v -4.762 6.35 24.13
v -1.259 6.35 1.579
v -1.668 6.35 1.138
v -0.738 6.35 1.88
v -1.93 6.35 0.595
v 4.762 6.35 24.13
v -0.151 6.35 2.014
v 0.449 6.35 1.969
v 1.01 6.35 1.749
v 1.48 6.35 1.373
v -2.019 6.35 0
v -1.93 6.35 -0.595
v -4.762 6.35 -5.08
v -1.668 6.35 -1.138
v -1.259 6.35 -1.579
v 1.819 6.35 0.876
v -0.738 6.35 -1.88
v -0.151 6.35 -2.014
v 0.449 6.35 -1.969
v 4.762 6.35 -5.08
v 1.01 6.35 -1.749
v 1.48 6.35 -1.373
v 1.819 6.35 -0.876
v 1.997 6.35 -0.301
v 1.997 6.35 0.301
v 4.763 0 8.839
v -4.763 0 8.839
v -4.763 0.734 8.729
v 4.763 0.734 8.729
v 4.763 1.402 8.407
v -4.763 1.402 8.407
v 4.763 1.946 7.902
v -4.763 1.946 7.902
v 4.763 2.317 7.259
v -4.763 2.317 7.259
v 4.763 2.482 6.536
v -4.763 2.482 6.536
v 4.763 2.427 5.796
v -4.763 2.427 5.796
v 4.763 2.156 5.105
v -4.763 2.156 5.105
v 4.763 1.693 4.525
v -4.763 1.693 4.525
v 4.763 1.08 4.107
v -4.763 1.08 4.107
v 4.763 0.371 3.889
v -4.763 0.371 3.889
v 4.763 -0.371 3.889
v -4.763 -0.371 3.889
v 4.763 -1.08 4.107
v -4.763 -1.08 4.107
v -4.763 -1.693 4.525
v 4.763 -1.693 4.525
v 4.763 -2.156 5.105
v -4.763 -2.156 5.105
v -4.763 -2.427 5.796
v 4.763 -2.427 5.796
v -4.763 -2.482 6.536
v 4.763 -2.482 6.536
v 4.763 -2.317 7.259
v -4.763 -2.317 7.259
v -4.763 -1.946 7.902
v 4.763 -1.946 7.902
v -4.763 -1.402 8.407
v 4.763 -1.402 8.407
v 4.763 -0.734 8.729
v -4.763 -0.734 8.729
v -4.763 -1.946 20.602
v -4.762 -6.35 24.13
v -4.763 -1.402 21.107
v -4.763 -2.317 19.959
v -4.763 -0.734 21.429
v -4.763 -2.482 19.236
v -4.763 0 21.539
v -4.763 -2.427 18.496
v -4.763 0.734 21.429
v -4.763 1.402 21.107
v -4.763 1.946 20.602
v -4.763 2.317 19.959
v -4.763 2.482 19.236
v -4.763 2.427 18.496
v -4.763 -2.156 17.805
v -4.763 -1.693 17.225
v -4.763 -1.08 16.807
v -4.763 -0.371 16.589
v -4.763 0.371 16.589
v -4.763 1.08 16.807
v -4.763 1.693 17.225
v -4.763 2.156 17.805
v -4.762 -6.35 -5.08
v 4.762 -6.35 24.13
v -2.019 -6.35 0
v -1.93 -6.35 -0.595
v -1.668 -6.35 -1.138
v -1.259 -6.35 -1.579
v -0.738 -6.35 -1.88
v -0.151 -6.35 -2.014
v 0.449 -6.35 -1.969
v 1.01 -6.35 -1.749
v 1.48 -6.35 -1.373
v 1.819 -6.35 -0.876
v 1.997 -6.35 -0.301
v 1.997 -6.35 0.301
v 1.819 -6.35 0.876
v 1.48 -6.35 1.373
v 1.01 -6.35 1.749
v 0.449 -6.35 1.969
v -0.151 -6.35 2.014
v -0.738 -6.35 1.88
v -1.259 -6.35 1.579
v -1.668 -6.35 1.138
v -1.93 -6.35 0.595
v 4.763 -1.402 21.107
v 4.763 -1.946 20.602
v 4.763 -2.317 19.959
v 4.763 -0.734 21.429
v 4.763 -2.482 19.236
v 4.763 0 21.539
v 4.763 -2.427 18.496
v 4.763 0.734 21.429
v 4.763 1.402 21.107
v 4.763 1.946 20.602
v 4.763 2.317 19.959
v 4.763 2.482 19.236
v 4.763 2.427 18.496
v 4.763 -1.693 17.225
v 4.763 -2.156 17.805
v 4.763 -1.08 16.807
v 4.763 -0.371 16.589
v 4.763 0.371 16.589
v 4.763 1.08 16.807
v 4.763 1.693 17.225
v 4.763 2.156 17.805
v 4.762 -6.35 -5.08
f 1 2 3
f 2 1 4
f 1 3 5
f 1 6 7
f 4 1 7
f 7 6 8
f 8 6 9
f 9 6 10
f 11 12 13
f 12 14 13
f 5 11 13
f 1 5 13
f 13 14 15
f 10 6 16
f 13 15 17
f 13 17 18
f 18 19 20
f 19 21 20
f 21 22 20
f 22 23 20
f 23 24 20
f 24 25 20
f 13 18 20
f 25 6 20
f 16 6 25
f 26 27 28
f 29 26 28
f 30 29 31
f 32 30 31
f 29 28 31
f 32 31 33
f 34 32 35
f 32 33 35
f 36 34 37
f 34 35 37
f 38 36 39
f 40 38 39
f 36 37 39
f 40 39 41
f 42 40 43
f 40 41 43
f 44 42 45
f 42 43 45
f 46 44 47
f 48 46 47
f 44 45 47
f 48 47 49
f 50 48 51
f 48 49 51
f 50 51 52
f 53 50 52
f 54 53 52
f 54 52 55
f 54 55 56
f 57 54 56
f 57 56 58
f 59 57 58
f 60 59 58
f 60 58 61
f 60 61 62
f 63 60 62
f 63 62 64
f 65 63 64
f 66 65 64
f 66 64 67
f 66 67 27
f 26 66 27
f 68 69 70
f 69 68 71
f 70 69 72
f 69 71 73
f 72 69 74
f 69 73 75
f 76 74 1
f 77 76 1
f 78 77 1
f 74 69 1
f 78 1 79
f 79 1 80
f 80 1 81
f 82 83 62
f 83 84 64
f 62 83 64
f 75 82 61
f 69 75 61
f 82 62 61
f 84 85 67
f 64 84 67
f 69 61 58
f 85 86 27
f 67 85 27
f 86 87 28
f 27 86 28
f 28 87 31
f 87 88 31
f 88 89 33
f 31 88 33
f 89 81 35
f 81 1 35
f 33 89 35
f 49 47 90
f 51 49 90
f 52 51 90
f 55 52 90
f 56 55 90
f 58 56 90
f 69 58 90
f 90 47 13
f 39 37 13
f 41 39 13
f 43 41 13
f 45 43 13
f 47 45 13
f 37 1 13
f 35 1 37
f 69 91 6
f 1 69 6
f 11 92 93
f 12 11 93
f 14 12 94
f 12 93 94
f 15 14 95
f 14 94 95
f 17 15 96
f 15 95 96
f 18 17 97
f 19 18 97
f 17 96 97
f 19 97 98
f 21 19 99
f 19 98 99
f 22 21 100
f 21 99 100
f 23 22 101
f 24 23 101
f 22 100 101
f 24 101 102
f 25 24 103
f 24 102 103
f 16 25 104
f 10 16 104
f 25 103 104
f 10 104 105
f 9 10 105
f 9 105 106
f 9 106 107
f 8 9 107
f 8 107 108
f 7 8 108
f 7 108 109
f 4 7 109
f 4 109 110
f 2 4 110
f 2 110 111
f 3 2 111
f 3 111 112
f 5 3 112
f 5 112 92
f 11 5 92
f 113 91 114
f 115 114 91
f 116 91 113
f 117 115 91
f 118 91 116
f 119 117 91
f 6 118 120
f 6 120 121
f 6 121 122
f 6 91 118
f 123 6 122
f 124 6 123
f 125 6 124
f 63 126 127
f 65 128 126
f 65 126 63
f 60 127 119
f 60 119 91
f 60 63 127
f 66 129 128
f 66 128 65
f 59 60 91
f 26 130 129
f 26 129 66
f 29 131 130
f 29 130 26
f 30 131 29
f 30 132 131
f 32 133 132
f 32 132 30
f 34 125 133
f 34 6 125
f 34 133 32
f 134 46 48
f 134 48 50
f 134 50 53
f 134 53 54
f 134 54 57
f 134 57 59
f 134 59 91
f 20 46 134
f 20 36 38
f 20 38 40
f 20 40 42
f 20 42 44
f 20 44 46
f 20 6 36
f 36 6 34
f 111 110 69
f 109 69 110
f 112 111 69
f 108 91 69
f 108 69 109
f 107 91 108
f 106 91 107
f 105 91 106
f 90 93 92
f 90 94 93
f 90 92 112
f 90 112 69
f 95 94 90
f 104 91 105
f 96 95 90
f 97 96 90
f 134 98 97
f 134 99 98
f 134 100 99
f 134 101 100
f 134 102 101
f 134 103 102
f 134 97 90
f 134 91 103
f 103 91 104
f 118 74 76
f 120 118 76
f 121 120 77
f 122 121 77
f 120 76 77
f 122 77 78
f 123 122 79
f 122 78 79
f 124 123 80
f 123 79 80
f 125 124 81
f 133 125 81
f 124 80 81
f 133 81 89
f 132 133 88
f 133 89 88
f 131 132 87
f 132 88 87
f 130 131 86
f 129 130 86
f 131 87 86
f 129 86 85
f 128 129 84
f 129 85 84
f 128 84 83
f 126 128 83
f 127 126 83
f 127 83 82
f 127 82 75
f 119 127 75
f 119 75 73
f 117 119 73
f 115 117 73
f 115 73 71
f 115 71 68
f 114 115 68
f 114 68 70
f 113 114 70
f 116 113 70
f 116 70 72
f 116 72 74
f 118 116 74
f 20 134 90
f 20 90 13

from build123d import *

# Parameters (mm, degrees)
SKETCH1_W              = 29.21
SKETCH1_H              = 12.7
BOSS_EXTRUDE1_DEPTH    = 4.7625
F_10_32_TAPPED_HOLE1_D = 4.0386
F_10_CLEARANCE_HOLE1_D = 4.9784


with BuildPart() as part:
    # Sketch1 → Boss-Extrude1 (new, symmetric)
    with BuildSketch(Plane(origin=(0, 0, 0), x_dir=(0, 0, -1), z_dir=(1, 0, 0))):
        with Locations((-9.525, 0)):
            Rectangle(SKETCH1_W, SKETCH1_H)
    extrude(amount=BOSS_EXTRUDE1_DEPTH, both=True)

    # #10-32 Tapped Hole1 (through all)
    with Locations(Plane(origin=(0, 6.35, 0), x_dir=(1, 0, 0), z_dir=(0, 1, 0))):
        with Locations((0, 0)):
            Hole(F_10_32_TAPPED_HOLE1_D / 2)

    # #10 Clearance Hole1 (through all)
    with Locations(Plane(origin=(4.7625, 0, 0), x_dir=(0, 0, -1), z_dir=(1, 0, 0))):
        with Locations((-6.35, 0), (-19.05, 0)):
            Hole(F_10_CLEARANCE_HOLE1_D / 2)


solid = part.part
